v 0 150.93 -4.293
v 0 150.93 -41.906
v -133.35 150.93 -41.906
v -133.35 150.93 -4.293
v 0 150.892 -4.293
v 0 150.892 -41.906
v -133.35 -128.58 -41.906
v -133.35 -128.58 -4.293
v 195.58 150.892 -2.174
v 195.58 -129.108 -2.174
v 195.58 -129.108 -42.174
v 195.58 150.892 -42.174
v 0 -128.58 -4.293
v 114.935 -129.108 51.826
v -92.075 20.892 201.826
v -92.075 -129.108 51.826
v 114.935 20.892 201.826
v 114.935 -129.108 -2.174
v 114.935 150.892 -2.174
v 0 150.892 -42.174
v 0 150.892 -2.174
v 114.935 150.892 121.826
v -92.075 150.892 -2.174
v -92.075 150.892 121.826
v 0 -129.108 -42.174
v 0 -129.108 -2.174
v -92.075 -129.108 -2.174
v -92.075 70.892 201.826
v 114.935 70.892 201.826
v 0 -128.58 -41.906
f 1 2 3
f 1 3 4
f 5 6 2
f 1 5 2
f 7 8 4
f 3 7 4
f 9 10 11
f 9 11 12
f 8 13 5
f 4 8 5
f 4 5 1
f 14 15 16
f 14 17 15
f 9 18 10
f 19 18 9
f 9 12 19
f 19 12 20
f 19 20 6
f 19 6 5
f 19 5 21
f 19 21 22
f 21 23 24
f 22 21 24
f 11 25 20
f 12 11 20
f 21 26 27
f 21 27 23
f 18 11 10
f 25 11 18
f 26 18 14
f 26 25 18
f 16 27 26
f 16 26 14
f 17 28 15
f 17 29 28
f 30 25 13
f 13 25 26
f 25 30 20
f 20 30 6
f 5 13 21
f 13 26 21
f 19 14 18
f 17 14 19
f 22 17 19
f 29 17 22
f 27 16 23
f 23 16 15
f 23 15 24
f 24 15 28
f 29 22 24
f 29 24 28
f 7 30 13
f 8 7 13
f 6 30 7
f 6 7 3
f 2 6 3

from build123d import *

# Parameters (mm, degrees)
F1_DEPTH = 114.935
F3_DEPTH = 92.075
F0_W     = 280
F0_H     = 40
F4_DEPTH = 195.58
F2_W     = 279.510707
F2_H     = 37.612499
F5_DEPTH = 133.35


with BuildPart() as f1:
    # F0 (on Right) → F1 (new body)
    with BuildSketch(Plane.YZ):
        Polygon((-129.108052, 51.825723), (-129.108052, -2.174277), (150.891948, -2.174277), (150.891948, 121.825723), (70.891948, 201.825723), (20.891948, 201.825723), align=None)
    extrude(amount=F1_DEPTH)

    # F0 (on Right) → F3 (join)
    with BuildSketch(Plane.YZ):
        Polygon((-129.108052, 51.825723), (-129.108052, -2.174277), (150.891948, -2.174277), (150.891948, 121.825723), (70.891948, 201.825723), (20.891948, 201.825723), align=None)
    extrude(amount=-F3_DEPTH)

    # F0 (on Right) → F4 (join)
    with BuildSketch(Plane.YZ):
        with Locations((10.891948, -22.174277)):
            Rectangle(F0_W, F0_H)
    extrude(amount=F4_DEPTH)

    # F2 (on Right) → F5 (join)
    with BuildSketch(Plane.YZ):
        with Locations((11.174976, -23.099343)):
            Rectangle(F2_W, F2_H)
    extrude(amount=-F5_DEPTH)


solid = f1.part
